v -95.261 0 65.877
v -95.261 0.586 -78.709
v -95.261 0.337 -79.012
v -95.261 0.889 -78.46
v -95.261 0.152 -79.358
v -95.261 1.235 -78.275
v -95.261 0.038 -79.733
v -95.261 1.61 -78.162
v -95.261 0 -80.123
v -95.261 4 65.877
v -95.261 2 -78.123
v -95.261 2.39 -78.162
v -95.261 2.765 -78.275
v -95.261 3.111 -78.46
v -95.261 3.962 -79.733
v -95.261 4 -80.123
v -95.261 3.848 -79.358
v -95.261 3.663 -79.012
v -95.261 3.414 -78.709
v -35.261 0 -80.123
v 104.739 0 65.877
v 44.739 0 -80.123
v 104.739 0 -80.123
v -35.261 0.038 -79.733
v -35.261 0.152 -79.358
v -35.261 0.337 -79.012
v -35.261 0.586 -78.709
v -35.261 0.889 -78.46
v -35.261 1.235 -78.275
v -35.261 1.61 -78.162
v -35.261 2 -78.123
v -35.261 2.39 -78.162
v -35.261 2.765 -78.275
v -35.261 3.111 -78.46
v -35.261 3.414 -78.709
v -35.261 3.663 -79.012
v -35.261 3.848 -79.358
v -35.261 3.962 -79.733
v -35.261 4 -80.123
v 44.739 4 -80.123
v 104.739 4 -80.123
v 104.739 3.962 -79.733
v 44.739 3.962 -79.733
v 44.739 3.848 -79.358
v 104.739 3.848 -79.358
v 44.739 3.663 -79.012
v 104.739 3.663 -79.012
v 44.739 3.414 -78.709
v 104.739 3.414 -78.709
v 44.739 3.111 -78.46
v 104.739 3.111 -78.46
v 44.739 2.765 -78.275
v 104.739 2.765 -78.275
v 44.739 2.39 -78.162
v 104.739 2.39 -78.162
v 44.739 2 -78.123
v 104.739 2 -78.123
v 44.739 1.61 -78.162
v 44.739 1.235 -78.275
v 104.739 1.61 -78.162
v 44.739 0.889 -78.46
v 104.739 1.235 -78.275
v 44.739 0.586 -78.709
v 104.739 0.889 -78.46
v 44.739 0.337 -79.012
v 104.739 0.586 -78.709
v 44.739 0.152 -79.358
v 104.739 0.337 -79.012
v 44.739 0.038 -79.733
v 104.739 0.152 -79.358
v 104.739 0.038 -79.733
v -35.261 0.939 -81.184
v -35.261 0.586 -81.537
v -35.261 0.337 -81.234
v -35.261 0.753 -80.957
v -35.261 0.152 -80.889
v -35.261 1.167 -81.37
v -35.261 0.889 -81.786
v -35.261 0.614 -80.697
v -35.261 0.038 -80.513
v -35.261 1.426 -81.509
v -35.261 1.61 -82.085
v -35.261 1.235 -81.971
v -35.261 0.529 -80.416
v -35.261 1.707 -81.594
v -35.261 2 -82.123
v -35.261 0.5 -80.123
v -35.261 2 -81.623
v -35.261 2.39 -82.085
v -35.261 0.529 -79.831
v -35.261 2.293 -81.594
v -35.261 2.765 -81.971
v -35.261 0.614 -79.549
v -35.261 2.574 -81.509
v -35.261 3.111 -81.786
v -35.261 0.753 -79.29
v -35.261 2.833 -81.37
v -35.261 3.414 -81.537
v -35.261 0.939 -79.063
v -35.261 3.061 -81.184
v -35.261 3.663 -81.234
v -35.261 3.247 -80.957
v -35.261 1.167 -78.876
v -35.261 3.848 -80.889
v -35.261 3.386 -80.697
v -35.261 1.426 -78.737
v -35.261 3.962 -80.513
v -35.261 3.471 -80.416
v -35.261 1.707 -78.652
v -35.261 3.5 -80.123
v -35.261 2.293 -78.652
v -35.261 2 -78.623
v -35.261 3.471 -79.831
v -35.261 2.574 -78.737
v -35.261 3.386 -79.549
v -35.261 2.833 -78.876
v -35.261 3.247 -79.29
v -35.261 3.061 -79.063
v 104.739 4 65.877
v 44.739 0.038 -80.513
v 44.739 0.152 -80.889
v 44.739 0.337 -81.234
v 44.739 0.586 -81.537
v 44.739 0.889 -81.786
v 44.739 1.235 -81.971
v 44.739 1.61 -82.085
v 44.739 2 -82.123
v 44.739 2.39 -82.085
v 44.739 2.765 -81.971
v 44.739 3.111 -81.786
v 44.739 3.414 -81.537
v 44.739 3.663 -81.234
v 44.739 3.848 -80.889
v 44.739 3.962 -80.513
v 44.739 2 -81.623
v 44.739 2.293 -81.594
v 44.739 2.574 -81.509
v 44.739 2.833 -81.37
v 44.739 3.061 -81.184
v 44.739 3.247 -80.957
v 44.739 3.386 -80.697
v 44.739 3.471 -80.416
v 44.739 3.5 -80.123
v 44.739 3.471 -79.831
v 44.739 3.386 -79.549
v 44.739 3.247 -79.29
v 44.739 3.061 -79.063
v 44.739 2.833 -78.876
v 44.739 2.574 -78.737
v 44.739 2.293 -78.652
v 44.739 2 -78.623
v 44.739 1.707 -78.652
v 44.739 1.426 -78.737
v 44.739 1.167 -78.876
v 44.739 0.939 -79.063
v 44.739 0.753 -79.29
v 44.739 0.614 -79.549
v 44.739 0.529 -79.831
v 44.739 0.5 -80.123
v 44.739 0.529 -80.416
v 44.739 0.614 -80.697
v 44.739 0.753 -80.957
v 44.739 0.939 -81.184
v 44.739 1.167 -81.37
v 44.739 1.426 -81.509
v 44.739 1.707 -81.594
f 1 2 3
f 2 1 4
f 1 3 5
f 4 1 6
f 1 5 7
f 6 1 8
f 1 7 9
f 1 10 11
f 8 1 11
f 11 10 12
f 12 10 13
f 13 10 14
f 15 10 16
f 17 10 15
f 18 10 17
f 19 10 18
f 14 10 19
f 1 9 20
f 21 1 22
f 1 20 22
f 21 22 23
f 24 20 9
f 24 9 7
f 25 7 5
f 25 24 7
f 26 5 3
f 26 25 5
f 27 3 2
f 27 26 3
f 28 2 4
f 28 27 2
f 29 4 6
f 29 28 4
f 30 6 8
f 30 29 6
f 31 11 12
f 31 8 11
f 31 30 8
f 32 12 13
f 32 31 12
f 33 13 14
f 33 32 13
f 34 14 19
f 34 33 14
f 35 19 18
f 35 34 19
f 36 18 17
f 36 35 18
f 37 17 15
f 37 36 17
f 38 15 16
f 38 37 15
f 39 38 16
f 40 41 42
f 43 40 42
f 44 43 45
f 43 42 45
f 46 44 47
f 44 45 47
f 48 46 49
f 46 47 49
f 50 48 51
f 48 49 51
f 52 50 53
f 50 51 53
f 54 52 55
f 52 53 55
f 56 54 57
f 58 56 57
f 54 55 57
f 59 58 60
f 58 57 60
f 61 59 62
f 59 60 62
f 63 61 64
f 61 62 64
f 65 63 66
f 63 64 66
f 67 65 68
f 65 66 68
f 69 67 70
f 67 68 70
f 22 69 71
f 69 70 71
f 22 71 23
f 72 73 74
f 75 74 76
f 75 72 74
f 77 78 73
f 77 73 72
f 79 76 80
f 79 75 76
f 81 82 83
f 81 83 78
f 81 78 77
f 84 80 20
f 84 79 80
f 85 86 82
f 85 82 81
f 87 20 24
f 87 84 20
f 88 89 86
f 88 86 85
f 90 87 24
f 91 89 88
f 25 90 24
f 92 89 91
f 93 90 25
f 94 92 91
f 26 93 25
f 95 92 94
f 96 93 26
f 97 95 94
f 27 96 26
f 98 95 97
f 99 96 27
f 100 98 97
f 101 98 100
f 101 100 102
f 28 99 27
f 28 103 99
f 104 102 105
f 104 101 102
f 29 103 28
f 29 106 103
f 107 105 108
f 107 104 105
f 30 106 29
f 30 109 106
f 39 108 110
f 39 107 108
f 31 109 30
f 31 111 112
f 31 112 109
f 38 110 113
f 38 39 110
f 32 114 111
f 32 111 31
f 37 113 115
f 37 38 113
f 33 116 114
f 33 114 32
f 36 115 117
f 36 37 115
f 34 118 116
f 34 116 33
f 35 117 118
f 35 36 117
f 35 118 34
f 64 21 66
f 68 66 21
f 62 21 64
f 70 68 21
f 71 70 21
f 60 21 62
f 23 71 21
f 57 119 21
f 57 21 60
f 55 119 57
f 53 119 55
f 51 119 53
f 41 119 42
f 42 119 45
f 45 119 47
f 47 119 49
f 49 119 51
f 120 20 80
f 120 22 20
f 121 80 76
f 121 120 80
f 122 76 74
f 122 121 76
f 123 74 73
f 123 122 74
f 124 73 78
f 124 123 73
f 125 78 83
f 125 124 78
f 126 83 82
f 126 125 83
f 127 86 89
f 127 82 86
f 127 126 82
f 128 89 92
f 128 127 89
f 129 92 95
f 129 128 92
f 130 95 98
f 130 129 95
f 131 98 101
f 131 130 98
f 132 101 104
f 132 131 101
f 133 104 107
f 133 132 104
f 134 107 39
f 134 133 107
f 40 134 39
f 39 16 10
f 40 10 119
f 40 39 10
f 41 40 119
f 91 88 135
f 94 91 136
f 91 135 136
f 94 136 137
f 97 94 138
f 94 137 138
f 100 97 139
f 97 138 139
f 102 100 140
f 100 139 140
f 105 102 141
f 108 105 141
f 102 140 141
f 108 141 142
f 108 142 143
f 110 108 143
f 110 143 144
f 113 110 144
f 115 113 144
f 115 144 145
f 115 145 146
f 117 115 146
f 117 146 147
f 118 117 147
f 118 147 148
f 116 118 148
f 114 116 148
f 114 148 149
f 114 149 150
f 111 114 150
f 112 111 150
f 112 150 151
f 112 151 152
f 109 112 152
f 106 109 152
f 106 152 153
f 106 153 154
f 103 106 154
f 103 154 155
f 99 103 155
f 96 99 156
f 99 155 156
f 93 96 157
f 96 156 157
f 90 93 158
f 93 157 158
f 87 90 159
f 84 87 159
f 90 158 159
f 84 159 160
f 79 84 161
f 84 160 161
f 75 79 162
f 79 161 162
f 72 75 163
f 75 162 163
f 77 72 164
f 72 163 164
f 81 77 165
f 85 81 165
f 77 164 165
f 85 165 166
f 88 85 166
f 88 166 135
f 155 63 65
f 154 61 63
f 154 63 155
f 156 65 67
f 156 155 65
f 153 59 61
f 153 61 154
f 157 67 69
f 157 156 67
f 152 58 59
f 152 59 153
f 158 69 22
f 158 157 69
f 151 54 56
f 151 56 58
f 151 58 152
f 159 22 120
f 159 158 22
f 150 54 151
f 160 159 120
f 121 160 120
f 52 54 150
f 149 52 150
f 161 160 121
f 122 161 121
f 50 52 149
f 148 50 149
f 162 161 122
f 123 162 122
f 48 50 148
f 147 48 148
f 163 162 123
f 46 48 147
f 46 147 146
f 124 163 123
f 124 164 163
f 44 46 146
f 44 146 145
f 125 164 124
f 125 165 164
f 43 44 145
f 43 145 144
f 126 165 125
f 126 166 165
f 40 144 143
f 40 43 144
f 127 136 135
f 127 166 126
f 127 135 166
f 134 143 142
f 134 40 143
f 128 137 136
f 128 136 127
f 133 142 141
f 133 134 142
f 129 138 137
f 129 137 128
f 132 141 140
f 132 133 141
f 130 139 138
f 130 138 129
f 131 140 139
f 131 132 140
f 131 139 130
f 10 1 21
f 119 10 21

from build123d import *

# Parameters (mm, degrees)
SKETCH_1_W          = 200
SKETCH_1_H          = 146
EXTRUDE_1_DEPTH     = 4
SKETCH_3_R          = 2
CUT_EXTRUDE_1_DEPTH = 202
SKETCH_3_2_R        = 2
SKETCH_3_2_R_2      = 1.5
EXTRUDE_1_2_DEPTH   = 200
SKETCH_4_R          = 2
CUT_EXTRUDE_2_DEPTH = 60
CUT_EXTRUDE_START   = -60
SKETCH_5_R          = 2
CUT_EXTRUDE_3_DEPTH = 60


with BuildPart() as part:
    # 草图1 → Extrude 1 (new body)
    with BuildSketch(Plane(origin=(0, 0, 0), x_dir=(1, 0, 0), z_dir=(0, 1, 0))):
        with Locations((4.739336493, 7.123222749)):
            Rectangle(SKETCH_1_W, SKETCH_1_H)
    extrude(amount=EXTRUDE_1_DEPTH)

    # 草图3 → 切除-拉伸1 (cut)
    with BuildSketch(Plane(origin=(104.739336493, 0, 0), x_dir=(0, 0, -1), z_dir=(1, 0, 0))):
        with Locations((80.123222749, 2)):
            Circle(SKETCH_3_R)
    extrude(amount=-CUT_EXTRUDE_1_DEPTH, mode=Mode.SUBTRACT)

    # 草图3<2> → Extrude 1 2 (add)
    with BuildSketch(Plane(origin=(104.739336493, 0, 0), x_dir=(0, 0, -1), z_dir=(1, 0, 0))):
        with Locations((80.123222749, 2)):
            Circle(SKETCH_3_2_R)
        with Locations((80.123222749, 2)):
            Circle(SKETCH_3_2_R_2, mode=Mode.SUBTRACT)
    extrude(amount=-EXTRUDE_1_2_DEPTH)

    # 草图4 → 切除-拉伸2 (cut)
    with BuildSketch(Plane(origin=(104.739336493, 0, 0), x_dir=(0, 0, -1), z_dir=(1, 0, 0))):
        with Locations((80.123222749, 2)):
            Circle(SKETCH_4_R)
    extrude(amount=-CUT_EXTRUDE_2_DEPTH, mode=Mode.SUBTRACT)

    # 草图5 → 切除-拉伸3 (cut)
    with BuildSketch(Plane.ZY.offset(95.260663507).offset(CUT_EXTRUDE_START)):
        with Locations((-80.123222749, 2)):
            Circle(SKETCH_5_R)
    extrude(amount=CUT_EXTRUDE_3_DEPTH, mode=Mode.SUBTRACT)


solid = part.part
